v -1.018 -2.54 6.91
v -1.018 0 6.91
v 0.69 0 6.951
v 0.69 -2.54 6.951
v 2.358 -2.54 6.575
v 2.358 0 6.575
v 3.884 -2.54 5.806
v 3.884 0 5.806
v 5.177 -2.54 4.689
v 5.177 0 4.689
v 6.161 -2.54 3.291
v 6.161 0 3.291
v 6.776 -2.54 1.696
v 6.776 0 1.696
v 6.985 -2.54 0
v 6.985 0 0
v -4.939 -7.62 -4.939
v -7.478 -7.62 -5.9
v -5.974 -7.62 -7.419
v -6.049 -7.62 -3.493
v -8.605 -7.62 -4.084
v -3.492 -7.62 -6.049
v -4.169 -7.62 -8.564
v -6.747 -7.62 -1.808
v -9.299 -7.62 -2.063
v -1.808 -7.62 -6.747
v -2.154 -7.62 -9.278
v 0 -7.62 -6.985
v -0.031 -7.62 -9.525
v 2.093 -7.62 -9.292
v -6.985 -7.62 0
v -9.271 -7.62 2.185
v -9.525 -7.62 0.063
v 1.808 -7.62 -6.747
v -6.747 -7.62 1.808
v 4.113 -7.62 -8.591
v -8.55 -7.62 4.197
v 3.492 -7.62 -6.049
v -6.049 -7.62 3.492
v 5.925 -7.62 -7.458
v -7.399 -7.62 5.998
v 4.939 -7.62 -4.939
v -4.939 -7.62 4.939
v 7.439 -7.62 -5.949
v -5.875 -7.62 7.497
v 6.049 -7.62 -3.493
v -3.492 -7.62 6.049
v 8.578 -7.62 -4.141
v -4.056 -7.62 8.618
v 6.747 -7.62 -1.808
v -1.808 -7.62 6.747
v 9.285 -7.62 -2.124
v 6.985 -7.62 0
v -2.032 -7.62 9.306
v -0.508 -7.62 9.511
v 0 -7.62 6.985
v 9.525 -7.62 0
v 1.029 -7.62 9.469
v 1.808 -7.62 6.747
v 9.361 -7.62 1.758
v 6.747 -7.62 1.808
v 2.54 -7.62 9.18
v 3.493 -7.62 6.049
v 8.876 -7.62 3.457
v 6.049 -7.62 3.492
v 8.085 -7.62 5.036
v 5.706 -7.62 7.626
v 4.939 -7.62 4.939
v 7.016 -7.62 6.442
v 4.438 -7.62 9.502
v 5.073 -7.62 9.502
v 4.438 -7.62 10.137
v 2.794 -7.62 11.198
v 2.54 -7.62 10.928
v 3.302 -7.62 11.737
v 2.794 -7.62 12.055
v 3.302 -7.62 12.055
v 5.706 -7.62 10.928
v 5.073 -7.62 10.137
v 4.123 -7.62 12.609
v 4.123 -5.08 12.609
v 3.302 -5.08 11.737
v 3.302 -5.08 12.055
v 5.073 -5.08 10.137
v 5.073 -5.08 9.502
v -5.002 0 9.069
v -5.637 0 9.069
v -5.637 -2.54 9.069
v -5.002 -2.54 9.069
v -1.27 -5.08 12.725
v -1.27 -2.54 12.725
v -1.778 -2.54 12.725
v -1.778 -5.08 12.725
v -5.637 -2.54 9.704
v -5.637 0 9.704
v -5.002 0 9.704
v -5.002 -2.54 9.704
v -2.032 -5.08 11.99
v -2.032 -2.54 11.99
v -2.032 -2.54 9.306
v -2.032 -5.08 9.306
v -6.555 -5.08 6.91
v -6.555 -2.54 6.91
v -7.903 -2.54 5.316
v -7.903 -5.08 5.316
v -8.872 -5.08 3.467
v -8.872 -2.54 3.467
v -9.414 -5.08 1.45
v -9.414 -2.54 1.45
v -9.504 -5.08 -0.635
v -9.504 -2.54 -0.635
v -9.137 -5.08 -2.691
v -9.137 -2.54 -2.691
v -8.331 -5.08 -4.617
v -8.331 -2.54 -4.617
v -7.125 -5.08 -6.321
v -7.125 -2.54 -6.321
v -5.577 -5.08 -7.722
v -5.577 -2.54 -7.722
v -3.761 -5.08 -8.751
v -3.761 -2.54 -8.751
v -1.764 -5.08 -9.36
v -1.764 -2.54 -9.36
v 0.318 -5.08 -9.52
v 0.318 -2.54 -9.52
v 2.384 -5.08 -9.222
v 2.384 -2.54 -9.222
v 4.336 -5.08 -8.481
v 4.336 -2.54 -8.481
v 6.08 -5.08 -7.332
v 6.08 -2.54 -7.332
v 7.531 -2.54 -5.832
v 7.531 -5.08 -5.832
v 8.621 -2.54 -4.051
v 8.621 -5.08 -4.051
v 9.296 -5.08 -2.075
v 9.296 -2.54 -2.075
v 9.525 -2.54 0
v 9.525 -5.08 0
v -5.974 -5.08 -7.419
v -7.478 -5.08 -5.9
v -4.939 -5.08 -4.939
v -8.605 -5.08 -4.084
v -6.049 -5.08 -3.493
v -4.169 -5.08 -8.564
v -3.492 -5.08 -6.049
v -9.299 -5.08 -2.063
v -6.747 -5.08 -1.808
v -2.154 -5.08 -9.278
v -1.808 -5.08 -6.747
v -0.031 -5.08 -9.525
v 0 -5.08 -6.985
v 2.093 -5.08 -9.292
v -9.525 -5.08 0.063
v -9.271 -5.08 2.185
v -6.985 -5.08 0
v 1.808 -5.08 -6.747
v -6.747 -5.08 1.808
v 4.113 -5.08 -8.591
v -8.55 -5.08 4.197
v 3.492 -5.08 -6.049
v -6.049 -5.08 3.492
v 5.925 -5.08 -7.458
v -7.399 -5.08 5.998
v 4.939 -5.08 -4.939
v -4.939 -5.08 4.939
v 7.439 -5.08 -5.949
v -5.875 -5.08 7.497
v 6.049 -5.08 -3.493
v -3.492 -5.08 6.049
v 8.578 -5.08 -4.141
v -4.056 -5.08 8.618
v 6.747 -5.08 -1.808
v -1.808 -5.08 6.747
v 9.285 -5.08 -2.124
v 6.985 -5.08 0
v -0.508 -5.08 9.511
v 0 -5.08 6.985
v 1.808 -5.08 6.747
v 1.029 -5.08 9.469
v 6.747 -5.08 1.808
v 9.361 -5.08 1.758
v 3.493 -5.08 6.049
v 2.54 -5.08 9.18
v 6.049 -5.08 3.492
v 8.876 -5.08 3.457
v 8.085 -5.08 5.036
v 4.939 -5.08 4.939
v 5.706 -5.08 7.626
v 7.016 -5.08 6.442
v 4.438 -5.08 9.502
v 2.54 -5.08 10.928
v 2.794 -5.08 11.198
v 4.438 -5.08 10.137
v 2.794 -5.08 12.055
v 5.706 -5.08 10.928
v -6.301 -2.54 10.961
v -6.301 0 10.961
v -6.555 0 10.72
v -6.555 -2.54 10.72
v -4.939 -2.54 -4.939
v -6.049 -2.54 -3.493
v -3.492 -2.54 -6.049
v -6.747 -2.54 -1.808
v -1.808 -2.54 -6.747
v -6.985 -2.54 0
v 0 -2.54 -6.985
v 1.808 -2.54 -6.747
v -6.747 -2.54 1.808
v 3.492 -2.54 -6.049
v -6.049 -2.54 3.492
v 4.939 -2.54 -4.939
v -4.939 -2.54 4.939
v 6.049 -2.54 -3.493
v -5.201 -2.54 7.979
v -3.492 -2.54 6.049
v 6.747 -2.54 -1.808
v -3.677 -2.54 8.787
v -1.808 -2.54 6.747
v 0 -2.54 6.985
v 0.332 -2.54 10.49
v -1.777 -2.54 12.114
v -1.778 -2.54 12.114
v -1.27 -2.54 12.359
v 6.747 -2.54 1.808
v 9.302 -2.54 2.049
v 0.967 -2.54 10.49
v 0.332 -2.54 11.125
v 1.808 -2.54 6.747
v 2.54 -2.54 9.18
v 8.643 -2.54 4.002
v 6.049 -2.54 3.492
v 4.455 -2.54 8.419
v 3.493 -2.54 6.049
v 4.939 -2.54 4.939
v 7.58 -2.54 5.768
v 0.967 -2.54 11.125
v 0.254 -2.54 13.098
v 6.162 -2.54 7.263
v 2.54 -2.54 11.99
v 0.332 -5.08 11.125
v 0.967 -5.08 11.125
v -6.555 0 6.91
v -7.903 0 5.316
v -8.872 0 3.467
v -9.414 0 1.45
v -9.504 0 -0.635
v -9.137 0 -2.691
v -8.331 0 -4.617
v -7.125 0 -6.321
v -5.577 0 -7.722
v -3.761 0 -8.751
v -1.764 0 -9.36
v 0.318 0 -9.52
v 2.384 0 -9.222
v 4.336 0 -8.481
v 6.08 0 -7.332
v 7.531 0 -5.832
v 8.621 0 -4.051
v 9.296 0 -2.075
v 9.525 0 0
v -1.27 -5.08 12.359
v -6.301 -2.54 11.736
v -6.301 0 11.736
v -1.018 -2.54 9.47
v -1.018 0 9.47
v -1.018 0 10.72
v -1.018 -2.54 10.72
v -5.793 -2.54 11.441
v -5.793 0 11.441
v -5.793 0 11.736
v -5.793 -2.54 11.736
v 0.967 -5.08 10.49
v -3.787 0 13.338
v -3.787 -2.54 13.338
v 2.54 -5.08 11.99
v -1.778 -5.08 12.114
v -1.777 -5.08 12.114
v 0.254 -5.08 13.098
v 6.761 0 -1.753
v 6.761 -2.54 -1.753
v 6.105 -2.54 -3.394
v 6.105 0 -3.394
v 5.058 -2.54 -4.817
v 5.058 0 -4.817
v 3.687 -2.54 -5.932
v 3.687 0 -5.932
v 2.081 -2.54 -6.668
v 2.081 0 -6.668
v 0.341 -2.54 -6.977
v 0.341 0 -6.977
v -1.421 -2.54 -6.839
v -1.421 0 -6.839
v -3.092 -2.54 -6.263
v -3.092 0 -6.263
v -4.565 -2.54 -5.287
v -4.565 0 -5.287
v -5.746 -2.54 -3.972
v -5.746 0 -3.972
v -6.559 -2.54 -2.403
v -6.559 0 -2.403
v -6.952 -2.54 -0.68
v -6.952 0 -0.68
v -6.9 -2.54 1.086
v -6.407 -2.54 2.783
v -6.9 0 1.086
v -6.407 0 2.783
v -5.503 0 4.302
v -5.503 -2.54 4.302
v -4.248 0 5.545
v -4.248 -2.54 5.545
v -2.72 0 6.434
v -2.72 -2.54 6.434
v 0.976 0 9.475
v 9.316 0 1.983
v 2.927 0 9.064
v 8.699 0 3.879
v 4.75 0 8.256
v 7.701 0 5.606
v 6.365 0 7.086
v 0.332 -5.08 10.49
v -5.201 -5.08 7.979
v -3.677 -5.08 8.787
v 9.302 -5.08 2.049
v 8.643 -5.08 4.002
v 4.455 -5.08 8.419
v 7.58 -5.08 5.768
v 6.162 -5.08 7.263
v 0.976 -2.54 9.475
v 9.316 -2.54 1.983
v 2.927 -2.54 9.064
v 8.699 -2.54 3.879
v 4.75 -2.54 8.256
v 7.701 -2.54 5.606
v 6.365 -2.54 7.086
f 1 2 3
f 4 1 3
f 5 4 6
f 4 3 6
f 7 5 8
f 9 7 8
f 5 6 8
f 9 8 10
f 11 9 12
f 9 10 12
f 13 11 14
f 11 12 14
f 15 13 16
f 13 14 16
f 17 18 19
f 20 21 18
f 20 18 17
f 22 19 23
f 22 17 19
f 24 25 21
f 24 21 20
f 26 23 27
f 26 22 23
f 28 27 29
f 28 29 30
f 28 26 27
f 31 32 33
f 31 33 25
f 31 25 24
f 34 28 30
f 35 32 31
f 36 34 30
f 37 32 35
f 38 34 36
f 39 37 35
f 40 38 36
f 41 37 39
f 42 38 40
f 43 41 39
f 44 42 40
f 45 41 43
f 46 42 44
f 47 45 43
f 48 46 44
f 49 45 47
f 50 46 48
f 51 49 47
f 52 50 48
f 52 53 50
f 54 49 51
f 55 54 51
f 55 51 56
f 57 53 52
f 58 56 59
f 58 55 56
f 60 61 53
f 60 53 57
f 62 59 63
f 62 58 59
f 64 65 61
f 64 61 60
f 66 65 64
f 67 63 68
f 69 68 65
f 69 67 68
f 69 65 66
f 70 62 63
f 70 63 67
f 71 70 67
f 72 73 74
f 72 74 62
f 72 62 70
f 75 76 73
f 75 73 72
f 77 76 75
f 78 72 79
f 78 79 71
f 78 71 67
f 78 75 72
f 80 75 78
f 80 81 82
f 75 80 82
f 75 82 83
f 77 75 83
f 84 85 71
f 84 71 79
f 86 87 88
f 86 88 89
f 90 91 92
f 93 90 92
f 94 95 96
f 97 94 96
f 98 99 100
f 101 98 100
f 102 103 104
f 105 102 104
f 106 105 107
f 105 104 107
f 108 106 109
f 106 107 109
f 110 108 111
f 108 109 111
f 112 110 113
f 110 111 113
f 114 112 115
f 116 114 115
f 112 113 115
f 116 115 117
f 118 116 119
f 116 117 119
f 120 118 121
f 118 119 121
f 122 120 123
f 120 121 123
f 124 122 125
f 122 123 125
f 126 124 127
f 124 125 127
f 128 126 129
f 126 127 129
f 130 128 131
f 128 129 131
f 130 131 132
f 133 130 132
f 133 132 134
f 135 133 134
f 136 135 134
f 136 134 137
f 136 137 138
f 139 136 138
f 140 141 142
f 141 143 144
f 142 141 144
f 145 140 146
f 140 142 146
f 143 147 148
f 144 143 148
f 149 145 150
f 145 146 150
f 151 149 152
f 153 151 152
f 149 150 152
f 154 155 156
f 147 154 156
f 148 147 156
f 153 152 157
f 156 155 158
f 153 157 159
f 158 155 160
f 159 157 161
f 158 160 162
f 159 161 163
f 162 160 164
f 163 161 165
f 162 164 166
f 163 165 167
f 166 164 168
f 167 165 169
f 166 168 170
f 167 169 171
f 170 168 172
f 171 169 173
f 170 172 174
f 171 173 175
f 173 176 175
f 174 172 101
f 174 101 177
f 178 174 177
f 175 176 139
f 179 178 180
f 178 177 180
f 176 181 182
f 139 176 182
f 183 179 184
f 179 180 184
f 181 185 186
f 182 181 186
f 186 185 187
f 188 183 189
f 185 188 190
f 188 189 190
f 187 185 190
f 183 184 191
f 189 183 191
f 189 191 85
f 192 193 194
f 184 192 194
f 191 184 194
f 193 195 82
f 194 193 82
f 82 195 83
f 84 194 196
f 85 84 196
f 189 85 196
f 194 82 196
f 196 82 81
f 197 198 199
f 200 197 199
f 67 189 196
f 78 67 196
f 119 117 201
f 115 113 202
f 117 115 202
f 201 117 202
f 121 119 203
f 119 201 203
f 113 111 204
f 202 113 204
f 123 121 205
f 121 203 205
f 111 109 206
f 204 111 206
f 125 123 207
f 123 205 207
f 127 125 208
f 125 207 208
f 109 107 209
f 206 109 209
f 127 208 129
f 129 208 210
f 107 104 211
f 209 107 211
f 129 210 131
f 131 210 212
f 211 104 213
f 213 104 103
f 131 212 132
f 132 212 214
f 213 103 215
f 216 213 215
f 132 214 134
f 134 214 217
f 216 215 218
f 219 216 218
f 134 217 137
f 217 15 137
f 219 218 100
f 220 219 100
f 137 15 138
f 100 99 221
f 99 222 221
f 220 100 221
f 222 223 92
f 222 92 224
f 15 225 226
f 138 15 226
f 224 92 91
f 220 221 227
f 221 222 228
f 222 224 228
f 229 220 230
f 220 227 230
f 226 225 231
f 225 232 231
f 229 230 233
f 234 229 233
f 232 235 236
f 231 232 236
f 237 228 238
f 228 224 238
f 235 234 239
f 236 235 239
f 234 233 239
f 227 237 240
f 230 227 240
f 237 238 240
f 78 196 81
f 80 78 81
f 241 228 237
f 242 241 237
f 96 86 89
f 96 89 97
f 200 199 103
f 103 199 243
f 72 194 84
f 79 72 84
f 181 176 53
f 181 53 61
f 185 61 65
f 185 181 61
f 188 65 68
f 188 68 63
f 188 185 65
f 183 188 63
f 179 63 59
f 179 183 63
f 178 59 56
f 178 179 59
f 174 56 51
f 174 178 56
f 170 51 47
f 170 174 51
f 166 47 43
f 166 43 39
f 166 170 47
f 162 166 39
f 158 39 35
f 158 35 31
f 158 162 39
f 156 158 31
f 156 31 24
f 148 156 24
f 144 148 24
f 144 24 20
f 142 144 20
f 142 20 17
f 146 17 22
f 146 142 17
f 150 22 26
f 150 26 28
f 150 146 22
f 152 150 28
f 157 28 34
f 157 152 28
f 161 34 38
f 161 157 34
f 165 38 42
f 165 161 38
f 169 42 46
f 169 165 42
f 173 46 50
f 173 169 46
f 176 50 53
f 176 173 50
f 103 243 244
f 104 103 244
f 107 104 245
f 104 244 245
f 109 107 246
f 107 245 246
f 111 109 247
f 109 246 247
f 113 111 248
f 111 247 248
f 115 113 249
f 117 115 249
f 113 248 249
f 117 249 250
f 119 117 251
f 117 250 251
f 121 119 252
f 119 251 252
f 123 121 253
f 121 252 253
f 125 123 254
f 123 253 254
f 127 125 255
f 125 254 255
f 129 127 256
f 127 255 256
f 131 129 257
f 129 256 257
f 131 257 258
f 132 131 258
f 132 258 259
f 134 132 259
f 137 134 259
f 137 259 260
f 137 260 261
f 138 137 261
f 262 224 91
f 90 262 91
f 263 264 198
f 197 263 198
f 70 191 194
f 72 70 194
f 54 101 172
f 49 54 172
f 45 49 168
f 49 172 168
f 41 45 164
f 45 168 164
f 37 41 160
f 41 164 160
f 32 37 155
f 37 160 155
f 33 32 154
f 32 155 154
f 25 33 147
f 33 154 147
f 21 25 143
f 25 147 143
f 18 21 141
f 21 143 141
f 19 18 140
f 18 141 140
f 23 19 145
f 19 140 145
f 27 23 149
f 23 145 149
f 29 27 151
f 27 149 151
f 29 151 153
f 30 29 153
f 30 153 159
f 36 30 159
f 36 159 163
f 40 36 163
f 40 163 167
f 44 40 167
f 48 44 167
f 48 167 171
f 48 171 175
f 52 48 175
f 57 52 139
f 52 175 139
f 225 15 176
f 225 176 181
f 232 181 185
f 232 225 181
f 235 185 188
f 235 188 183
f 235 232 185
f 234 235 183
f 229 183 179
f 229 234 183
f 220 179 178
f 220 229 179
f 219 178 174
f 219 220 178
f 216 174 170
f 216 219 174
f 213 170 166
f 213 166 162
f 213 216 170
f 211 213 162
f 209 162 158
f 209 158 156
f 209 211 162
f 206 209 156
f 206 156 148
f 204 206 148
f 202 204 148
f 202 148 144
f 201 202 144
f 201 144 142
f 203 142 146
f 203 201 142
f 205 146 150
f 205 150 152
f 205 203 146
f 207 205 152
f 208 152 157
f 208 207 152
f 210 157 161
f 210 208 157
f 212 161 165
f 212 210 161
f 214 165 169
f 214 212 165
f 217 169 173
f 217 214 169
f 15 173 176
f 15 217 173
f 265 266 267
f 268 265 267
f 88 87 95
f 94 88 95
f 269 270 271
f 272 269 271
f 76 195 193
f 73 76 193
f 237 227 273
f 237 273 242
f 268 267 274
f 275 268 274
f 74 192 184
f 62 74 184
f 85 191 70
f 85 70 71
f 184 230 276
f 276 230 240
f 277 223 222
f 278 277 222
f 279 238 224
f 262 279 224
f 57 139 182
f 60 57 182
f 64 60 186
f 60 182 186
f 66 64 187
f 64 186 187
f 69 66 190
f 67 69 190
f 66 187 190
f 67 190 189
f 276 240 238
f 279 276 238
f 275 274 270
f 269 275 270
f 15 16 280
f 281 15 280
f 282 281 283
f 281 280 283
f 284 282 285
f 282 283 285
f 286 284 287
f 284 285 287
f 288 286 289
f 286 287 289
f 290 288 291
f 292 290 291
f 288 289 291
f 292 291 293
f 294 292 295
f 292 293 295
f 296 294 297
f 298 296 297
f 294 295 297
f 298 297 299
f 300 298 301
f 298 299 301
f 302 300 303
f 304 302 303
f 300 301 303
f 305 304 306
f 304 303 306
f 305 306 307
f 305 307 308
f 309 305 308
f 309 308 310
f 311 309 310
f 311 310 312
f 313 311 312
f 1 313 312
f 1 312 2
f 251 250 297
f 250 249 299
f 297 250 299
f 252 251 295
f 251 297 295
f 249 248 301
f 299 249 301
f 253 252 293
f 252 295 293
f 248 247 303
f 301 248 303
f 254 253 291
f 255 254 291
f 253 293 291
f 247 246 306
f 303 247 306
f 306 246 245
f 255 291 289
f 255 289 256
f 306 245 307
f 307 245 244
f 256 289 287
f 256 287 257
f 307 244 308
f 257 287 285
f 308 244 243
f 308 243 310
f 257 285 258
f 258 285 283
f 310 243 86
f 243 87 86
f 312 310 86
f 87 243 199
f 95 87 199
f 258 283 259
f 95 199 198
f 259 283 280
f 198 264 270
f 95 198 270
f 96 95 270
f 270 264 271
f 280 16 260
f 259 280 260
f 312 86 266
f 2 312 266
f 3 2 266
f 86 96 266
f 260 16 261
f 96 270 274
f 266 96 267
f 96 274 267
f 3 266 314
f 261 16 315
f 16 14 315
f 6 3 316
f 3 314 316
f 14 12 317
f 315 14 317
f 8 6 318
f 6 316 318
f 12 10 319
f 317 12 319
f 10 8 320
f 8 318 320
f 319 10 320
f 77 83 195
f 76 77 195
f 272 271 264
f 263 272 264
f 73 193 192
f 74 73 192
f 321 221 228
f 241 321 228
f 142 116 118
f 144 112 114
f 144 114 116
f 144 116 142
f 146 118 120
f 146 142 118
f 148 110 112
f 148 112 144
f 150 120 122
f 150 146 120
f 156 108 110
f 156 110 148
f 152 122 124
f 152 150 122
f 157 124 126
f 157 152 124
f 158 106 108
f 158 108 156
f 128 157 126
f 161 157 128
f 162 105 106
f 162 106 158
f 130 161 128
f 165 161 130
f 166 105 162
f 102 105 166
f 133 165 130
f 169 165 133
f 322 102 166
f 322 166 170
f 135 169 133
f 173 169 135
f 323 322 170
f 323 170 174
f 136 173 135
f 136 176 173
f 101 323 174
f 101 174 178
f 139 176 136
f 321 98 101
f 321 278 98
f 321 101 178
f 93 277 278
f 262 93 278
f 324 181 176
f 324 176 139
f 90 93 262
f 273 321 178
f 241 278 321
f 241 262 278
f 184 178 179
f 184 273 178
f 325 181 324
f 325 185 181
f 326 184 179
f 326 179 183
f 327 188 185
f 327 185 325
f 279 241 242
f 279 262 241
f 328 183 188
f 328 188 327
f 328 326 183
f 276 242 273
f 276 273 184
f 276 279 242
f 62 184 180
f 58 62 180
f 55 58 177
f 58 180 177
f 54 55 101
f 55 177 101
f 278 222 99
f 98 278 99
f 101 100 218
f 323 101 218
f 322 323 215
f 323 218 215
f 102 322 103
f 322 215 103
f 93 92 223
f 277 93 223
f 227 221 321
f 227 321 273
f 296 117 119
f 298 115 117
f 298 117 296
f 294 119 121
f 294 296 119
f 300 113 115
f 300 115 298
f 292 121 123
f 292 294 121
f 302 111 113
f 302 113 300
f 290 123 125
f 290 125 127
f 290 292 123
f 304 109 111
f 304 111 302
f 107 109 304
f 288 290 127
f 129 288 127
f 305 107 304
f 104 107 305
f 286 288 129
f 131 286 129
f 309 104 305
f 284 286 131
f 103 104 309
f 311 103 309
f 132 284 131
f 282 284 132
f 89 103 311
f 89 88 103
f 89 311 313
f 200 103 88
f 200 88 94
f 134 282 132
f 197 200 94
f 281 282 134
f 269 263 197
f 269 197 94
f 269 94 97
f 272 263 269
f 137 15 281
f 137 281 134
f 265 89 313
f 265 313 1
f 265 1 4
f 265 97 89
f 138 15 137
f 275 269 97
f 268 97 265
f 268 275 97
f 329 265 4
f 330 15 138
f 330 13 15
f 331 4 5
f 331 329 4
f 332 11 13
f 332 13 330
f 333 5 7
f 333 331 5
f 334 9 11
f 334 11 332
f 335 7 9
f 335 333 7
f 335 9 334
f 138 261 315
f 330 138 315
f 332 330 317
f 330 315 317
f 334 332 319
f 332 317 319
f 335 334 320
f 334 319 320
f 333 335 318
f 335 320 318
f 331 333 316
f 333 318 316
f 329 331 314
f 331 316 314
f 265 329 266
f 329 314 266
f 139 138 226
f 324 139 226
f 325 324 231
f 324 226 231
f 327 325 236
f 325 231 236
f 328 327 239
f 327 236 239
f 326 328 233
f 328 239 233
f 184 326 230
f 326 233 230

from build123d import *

# Parameters (mm, degrees)
F0_W     = 0.635
F0_H     = 0.635
F1_DEPTH = 2.54
F2_R     = 6.985
F2_W     = 0.635
F2_H     = 0.635
F3_DEPTH = 2.54
F4_W     = 0.635
F4_H     = 0.635
F4_R     = 6.985
F5_DEPTH = 2.54


with BuildPart() as f1:
    # F0 (on Front) → F1 (new body)
    with BuildSketch(Plane.XZ):
        Polygon((-6.3013472773, 10.9605143963), (-6.5553472773, 10.7203579556), (-6.3013472773, 10.7203579556), align=None)
        Polygon((-5.7933472773, 10.7203579556), (-1.018419327, 10.7203579556), (-3.7868833021, 13.3379345482), (-5.7933472773, 11.4408272778), align=None)
        with BuildLine():
            Line((-6.5553472773, 10.7203579556), (-6.5553472773, 6.9103579556))
            ThreePointArc((-6.5553472773, 6.9103579556), (-3.9973662574, 8.6456166931), (-1.018419327, 9.4703984644))
            Line((-1.018419327, 9.4703984644), (-1.018419327, 10.7203579556))
            Line((-1.018419327, 10.7203579556), (-5.7933472773, 10.7203579556))
            Line((-5.7933472773, 10.7203579556), (-6.3013472773, 10.7203579556))
            Line((-6.3013472773, 10.7203579556), (-6.5553472773, 10.7203579556))
        make_face()
        with Locations((-5.3196260977, 9.3868579556)):
            Rectangle(F0_W, F0_H, mode=Mode.SUBTRACT)
        with BuildLine():
            Line((-6.5553472773, 6.9103579556), (-1.018419327, 6.9103579556))
            Line((-1.018419327, 6.9103579556), (-1.018419327, 9.4703984644))
            ThreePointArc((-1.018419327, 9.4703984644), (-3.9973662574, 8.6456166931), (-6.5553472773, 6.9103579556))
        make_face()
        with BuildLine():
            Line((-1.018419327, 9.4703984644), (-1.018419327, 6.9103579556))
            Line((-1.018419327, 6.9103579556), (-6.5553472773, 6.9103579556))
            ThreePointArc((-6.5553472773, 6.9103579556), (-3.7607141731, -8.7511515761), (9.525, 0))
            ThreePointArc((9.525, 0), (6.3649501534, 7.0861156175), (-1.018419327, 9.4703984644))
        make_face()
        with BuildLine():
            ThreePointArc((-1.018419327, 6.9103579556), (4.5648968225, 5.2869596177), (6.985, 0))
            ThreePointArc((6.985, 0), (-4.5648968225, -5.2869596177), (-1.018419327, 6.9103579556))
        make_face(mode=Mode.SUBTRACT)
        Polygon((-6.3013472773, 11.7363579556), (-6.3013472773, 10.9605143963), (-5.7933472773, 11.4408272778), (-5.7933472773, 11.7363579556), align=None)
        Polygon((-6.3013472773, 10.9605143963), (-6.3013472773, 10.7203579556), (-5.7933472773, 10.7203579556), (-5.7933472773, 11.4408272778), align=None)
    extrude(amount=F1_DEPTH)


with BuildPart() as f3:
    # F2 (on face) → F3 (new body)
    with BuildSketch(Plane.XZ.offset(2.54)):
        with BuildLine():
            ThreePointArc((-2.032, 9.3057294717), (-4.4575872947, 8.4175733148), (-6.5553472773, 6.9103579556))
            ThreePointArc((-6.5553472773, 6.9103579556), (-3.7607141731, -8.7511515761), (9.525, 0))
            ThreePointArc((9.525, 0), (7.5802086053, 5.7676739246), (2.54, 9.1800885072))
            Line((2.54, 9.1800885072), (2.54, 7.1643579556))
            Line((2.54, 7.1643579556), (-2.032, 7.1643579556))
            Line((-2.032, 7.1643579556), (-2.032, 9.3057294717))
        make_face()
        Circle(F2_R, mode=Mode.SUBTRACT)
        with BuildLine():
            ThreePointArc((-1.018419327, 9.4703984644), (-1.5274303542, 9.4017328995), (-2.032, 9.3057294717))
            Line((-2.032, 9.3057294717), (-2.032, 7.1643579556))
            Line((-2.032, 7.1643579556), (2.54, 7.1643579556))
            Line((2.54, 7.1643579556), (2.54, 9.1800885072))
            ThreePointArc((2.54, 9.1800885072), (0.7745139792, 9.4934584371), (-1.018419327, 9.4703984644))
        make_face()
        with BuildLine():
            ThreePointArc((-1.018419327, 9.4703984644), (0.7745139792, 9.4934584371), (2.54, 9.1800885072))
            Line((2.54, 9.1800885072), (2.54, 11.9903579556))
            Line((2.54, 11.9903579556), (-2.032, 11.9903579556))
            Line((-2.032, 11.9903579556), (-2.032, 11.6786962501))
            Line((-2.032, 11.6786962501), (-1.018419327, 10.7203579556))
            Line((-1.018419327, 10.7203579556), (-1.018419327, 9.4703984644))
        make_face()
        with Locations((0.6493412938, 10.8072543788)):
            Rectangle(F2_W, F2_H, mode=Mode.SUBTRACT)
        Polygon((-2.032, 11.9903579556), (2.54, 11.9903579556), (0.254, 13.0975182873), (-1.27, 12.3594113995), (-1.27, 12.1140610427), (-1.7765850895, 12.1140610427), align=None)
        with BuildLine():
            Line((-2.032, 11.6786962501), (-2.032, 9.3057294717))
            ThreePointArc((-2.032, 9.3057294717), (-1.5274303542, 9.4017328995), (-1.018419327, 9.4703984644))
            Line((-1.018419327, 9.4703984644), (-1.018419327, 10.7203579556))
            Line((-1.018419327, 10.7203579556), (-2.032, 11.6786962501))
        make_face()
        Polygon((-1.778, 12.1140610427), (-1.7765850895, 12.1140610427), (-1.27, 12.3594113995), (-1.27, 12.7247357741), (-1.778, 12.7247357741), align=None)
        Polygon((-1.27, 12.3594113995), (-1.7765850895, 12.1140610427), (-1.27, 12.1140610427), align=None)
    extrude(amount=F3_DEPTH)


with BuildPart() as f5:
    # F4 (on face) → F5 (new body)
    with BuildSketch(Plane.XZ.offset(5.08)):
        with BuildLine():
            ThreePointArc((2.54, 9.1800885072), (4.1957617936, 8.5510939634), (5.7064392712, 7.6264130392))
            Line((5.7064392712, 7.6264130392), (5.7064392712, 10.9284130392))
            Line((5.7064392712, 10.9284130392), (2.54, 10.9284130392))
            Line((2.54, 10.9284130392), (2.54, 9.1800885072))
        make_face()
        with Locations((4.7555824557, 9.8191454709)):
            Rectangle(F4_W, F4_H, mode=Mode.SUBTRACT)
        Polygon((2.54, 10.9284130392), (5.7064392712, 10.9284130392), (4.1232196356, 12.6085496974), (3.302, 11.7370589811), (3.302, 11.0386284068), (2.794, 11.0386284068), (2.794, 11.1979616865), align=None)
        with BuildLine():
            ThreePointArc((-2.032, 9.3057294717), (-5.9737268518, -7.4189091179), (9.525, 0))
            ThreePointArc((9.525, 0), (8.5170258617, 4.2644924048), (5.7064392712, 7.6264130392))
            Line((5.7064392712, 7.6264130392), (2.54, 7.6264130392))
            Line((2.54, 7.6264130392), (2.54, 9.1800885072))
            ThreePointArc((2.54, 9.1800885072), (0.2616532304, 9.5214054943), (-2.032, 9.3057294717))
        make_face()
        Circle(F4_R, mode=Mode.SUBTRACT)
        with BuildLine():
            Line((2.54, 7.6264130392), (5.7064392712, 7.6264130392))
            ThreePointArc((5.7064392712, 7.6264130392), (4.1957617936, 8.5510939634), (2.54, 9.1800885072))
            Line((2.54, 9.1800885072), (2.54, 7.6264130392))
        make_face()
        Polygon((3.302, 11.7370589811), (2.794, 11.1979616865), (2.794, 11.0386284068), (3.302, 11.0386284068), align=None)
        Polygon((2.794, 12.0546284068), (2.794, 11.1979616865), (3.302, 11.7370589811), (3.302, 12.0546284068), align=None)
    extrude(amount=F5_DEPTH)


solid = Compound([f1.part, f3.part, f5.part])
